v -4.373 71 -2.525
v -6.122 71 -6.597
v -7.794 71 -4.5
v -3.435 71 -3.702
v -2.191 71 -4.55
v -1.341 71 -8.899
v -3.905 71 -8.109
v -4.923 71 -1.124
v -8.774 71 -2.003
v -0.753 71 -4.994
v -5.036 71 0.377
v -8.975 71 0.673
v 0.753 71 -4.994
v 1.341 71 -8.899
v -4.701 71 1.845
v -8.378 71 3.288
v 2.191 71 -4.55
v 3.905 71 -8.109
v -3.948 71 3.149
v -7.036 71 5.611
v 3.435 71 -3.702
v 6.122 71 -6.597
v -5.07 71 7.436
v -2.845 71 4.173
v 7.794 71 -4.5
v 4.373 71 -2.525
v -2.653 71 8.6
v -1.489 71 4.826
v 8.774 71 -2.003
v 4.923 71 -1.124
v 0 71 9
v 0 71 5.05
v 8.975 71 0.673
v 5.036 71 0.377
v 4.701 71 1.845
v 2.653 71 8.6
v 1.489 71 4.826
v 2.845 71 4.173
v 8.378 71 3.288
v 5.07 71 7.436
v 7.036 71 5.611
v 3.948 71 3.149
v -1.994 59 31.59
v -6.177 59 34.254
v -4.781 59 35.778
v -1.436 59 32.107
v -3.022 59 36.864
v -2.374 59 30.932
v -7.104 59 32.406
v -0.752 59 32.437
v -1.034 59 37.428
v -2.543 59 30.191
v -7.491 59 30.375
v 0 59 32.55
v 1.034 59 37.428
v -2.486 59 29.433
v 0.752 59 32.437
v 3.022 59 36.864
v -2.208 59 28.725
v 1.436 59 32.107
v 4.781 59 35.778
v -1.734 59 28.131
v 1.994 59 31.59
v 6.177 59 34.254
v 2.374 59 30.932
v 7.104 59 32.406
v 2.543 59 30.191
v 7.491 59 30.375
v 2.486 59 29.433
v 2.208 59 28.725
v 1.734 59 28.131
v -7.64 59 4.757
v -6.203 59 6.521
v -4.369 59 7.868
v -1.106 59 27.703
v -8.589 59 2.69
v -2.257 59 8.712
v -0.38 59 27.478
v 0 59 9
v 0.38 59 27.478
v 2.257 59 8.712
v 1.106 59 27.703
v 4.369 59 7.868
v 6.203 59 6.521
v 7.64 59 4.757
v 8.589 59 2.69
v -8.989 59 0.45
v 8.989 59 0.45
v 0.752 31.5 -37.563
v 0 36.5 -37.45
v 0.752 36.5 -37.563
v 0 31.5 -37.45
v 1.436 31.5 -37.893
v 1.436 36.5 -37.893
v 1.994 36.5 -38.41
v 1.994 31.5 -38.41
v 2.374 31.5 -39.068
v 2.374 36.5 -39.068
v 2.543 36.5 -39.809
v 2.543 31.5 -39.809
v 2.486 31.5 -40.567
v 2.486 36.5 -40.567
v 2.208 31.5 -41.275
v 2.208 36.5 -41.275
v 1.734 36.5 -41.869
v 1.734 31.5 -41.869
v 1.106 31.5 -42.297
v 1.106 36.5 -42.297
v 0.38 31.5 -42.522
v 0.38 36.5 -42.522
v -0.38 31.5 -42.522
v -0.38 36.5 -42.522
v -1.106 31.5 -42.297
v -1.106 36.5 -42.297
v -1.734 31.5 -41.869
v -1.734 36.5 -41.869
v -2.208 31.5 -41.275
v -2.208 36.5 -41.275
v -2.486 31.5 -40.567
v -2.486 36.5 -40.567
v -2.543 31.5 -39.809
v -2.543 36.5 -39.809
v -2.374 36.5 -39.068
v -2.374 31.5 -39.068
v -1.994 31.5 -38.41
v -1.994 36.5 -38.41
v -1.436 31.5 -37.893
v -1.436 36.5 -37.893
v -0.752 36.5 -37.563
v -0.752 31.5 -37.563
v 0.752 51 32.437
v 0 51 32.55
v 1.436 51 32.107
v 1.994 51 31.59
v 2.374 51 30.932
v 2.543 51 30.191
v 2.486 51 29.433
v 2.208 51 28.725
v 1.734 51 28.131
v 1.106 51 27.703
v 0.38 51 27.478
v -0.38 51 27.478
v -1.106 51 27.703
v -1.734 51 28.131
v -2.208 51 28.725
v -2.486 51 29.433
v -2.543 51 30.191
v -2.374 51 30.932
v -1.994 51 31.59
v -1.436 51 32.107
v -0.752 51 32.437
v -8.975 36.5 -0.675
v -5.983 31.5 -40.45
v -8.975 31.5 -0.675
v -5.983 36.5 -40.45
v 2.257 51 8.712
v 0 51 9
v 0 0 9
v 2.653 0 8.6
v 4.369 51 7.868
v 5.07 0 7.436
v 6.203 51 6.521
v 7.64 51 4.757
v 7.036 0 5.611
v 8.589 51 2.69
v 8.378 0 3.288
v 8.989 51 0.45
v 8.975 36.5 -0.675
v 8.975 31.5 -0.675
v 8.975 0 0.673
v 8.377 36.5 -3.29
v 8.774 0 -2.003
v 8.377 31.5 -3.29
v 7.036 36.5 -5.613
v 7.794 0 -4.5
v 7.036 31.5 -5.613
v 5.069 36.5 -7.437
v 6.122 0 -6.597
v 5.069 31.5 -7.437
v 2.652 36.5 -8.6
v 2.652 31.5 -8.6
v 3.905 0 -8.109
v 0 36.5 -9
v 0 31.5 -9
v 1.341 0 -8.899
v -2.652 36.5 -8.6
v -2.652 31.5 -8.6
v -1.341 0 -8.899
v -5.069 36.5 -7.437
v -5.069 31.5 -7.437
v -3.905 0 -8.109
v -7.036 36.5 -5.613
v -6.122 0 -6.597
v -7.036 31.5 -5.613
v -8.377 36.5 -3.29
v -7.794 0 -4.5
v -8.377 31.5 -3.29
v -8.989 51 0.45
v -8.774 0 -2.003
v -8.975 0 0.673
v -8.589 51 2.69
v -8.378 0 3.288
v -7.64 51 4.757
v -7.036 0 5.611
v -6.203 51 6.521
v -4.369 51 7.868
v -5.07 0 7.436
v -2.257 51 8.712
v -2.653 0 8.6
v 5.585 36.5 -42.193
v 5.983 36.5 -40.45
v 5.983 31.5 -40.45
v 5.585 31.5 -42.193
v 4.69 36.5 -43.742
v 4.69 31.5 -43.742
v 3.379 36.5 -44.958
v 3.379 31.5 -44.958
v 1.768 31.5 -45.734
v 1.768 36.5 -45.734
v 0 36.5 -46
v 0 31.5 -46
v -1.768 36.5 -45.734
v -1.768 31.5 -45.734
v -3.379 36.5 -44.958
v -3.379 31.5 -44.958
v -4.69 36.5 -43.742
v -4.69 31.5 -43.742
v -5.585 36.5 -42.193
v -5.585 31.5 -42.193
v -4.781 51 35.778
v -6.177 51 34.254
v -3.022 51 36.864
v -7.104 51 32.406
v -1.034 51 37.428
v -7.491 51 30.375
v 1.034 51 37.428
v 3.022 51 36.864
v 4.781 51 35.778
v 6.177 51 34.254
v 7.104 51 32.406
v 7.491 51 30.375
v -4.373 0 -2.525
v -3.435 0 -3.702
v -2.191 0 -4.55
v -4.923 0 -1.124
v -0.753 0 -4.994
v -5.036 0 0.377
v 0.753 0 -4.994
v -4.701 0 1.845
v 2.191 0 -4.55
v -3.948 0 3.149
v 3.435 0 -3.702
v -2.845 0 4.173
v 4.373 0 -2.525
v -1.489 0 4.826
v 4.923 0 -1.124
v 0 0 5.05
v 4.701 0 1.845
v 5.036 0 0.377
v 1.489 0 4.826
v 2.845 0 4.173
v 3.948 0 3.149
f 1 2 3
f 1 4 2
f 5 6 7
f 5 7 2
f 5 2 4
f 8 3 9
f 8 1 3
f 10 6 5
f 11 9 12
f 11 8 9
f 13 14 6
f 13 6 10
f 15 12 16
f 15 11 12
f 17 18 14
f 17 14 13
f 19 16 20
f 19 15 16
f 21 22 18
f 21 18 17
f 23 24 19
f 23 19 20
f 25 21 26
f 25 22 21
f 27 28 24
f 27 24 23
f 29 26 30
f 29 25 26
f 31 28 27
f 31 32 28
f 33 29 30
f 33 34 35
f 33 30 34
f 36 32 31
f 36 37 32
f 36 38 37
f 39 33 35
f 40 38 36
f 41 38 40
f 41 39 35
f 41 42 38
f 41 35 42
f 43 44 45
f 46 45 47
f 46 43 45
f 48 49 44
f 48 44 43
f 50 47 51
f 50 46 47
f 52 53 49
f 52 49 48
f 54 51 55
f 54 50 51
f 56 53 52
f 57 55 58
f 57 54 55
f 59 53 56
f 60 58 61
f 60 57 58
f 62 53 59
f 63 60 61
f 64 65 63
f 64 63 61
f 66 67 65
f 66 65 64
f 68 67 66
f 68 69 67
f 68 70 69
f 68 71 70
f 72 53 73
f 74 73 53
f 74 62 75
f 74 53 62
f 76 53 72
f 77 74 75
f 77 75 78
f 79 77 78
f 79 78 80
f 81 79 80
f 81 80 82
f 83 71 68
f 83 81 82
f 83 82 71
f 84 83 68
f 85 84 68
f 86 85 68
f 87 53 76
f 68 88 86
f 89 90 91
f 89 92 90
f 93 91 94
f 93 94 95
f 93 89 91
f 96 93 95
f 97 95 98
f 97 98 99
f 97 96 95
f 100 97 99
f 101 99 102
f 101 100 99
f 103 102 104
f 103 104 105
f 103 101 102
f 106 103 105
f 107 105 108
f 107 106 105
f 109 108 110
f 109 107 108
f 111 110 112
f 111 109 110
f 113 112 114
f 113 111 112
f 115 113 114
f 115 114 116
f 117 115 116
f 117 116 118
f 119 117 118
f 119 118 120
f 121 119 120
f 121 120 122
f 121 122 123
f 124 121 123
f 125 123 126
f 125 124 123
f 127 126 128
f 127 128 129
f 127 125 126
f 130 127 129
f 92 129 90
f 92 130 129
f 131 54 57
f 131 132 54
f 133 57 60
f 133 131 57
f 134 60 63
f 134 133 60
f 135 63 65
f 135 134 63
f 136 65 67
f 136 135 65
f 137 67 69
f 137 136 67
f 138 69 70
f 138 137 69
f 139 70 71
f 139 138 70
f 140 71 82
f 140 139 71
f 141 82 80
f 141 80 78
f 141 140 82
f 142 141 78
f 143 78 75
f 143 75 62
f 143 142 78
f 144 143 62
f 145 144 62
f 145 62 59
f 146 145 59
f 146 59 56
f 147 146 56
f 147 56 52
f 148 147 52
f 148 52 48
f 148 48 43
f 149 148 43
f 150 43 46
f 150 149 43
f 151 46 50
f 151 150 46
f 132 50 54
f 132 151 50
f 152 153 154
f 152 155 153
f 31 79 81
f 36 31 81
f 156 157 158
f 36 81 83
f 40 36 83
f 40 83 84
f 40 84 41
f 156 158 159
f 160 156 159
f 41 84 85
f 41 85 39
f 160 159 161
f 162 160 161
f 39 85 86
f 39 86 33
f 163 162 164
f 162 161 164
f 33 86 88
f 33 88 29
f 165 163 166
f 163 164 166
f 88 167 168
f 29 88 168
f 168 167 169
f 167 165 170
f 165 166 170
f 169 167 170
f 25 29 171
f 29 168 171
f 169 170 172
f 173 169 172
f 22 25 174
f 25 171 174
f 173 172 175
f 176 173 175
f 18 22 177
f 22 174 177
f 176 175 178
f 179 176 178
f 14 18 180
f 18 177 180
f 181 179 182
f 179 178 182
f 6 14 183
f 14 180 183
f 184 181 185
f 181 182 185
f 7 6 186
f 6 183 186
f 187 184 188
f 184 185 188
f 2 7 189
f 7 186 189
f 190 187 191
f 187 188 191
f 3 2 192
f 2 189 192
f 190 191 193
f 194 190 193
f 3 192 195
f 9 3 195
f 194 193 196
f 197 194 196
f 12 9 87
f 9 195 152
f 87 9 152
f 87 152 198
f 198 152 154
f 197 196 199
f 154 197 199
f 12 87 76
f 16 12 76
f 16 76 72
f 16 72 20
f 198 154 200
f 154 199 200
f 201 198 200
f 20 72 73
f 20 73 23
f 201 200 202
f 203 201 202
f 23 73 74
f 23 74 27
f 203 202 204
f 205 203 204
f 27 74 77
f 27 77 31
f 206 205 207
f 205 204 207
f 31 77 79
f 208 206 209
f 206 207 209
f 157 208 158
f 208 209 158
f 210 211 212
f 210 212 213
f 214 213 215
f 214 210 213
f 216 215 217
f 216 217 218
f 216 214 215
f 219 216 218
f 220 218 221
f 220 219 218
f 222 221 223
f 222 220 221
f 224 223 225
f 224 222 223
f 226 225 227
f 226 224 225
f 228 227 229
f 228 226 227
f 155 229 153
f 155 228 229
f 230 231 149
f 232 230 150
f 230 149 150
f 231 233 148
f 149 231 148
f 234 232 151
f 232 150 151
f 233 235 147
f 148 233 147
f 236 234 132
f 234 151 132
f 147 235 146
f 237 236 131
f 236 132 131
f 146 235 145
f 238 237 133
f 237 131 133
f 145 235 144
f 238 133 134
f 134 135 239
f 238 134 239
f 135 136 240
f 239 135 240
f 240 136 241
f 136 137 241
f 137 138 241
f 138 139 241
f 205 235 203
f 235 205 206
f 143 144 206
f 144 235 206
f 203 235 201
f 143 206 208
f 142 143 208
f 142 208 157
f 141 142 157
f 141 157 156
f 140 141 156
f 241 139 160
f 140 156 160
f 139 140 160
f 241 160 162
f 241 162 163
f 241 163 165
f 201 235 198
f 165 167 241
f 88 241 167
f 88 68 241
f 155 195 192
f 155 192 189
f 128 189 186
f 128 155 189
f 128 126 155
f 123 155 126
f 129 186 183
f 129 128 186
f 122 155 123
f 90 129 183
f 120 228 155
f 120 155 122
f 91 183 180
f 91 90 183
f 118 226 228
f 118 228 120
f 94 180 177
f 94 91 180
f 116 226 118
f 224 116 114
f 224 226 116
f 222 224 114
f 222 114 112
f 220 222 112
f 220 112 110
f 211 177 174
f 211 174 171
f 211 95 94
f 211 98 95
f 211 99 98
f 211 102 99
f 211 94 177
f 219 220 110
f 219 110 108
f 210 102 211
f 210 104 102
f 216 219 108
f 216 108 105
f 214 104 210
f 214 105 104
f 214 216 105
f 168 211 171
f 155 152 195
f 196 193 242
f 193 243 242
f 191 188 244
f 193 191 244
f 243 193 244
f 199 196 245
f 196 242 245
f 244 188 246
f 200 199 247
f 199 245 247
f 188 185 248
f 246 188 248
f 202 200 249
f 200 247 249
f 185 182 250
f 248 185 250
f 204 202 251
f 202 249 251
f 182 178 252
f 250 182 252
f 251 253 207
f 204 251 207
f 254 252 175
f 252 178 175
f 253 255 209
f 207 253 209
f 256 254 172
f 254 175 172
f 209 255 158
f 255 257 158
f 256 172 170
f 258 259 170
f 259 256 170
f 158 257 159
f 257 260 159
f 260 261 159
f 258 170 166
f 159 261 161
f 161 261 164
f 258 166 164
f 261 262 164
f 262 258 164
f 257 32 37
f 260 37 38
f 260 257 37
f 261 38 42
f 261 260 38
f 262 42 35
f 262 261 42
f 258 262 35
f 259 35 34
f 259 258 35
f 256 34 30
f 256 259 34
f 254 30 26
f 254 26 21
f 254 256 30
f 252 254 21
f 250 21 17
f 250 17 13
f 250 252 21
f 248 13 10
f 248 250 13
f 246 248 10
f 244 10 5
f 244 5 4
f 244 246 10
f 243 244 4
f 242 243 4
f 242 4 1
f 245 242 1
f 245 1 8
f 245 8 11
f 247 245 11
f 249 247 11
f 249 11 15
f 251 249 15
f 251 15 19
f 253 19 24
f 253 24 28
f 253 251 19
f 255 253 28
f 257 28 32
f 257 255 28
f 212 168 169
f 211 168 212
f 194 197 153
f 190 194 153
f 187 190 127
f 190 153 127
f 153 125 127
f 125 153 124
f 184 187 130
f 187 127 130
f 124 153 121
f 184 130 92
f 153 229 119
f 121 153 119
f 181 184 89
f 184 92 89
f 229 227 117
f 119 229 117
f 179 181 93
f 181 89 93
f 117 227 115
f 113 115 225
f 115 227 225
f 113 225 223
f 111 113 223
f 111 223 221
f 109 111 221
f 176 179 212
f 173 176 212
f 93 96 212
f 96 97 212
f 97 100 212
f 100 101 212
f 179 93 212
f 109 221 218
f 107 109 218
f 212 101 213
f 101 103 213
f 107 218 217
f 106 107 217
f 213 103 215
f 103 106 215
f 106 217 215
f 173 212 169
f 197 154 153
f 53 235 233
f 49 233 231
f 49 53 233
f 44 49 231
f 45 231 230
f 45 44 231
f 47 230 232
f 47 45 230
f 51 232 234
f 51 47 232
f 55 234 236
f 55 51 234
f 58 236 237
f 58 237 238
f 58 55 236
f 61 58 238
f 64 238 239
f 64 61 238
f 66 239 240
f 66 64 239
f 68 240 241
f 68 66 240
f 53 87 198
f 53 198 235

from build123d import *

# Parameters (mm, degrees)
SKETCH_1_R      = 9
SKETCH_1_R_2    = 5.05
EXTRUDE_1_DEPTH = 71
SKETCH_2_R      = 2.55
EXTRUDE_2_DEPTH = 2.5
SKETCH_3_R      = 2.55
EXTRUDE_3_DEPTH = 4


with BuildPart() as part:
    # 草图1 → 凸台-拉伸1 (new body)
    with BuildSketch(Plane(origin=(0, 0, 0), x_dir=(1, 0, 0), z_dir=(0, 1, 0))):
        with Locations(Location((0, 0, 0), (0, 0, 270))):
            Circle(SKETCH_1_R)
        with Locations(Location((0, 0, 0), (0, 0, 270))):
            Circle(SKETCH_1_R_2, mode=Mode.SUBTRACT)
    extrude(amount=EXTRUDE_1_DEPTH)

    # 草图2 → 凸台-拉伸2 (add, symmetric)
    with BuildSketch(Plane(origin=(0, 34, 0), x_dir=(1, 0, 0), z_dir=(0, 1, 0))):
        with BuildLine():
            ThreePointArc((-8.974651804, 0.675), (0, 9), (8.974651804, 0.675))
            Line((8.974651804, 0.675), (5.983101203, 40.45))
            ThreePointArc((5.983101203, 40.45), (0, 46), (-5.983101203, 40.45))
            Line((-5.983101203, 40.45), (-8.974651804, 0.675))
        make_face()
        with Locations(Location((0, 40, 0), (0, 0, 270))):
            Circle(SKETCH_2_R, mode=Mode.SUBTRACT)
    extrude(amount=EXTRUDE_2_DEPTH, both=True)

    # 草图3 → 凸台-拉伸3 (add, symmetric)
    with BuildSketch(Plane(origin=(0, 55, 0), x_dir=(1, 0, 0), z_dir=(0, 1, 0))):
        with BuildLine():
            ThreePointArc((8.98874296, -0.45), (0, -9), (-8.98874296, -0.45))
            Line((-8.98874296, -0.45), (-7.490619133, -30.375))
            ThreePointArc((-7.490619133, -30.375), (0, -37.5), (7.490619133, -30.375))
            Line((7.490619133, -30.375), (8.98874296, -0.45))
        make_face()
        with Locations(Location((0, -30, 0), (0, 0, 270))):
            Circle(SKETCH_3_R, mode=Mode.SUBTRACT)
    extrude(amount=EXTRUDE_3_DEPTH, both=True)


solid = part.part
